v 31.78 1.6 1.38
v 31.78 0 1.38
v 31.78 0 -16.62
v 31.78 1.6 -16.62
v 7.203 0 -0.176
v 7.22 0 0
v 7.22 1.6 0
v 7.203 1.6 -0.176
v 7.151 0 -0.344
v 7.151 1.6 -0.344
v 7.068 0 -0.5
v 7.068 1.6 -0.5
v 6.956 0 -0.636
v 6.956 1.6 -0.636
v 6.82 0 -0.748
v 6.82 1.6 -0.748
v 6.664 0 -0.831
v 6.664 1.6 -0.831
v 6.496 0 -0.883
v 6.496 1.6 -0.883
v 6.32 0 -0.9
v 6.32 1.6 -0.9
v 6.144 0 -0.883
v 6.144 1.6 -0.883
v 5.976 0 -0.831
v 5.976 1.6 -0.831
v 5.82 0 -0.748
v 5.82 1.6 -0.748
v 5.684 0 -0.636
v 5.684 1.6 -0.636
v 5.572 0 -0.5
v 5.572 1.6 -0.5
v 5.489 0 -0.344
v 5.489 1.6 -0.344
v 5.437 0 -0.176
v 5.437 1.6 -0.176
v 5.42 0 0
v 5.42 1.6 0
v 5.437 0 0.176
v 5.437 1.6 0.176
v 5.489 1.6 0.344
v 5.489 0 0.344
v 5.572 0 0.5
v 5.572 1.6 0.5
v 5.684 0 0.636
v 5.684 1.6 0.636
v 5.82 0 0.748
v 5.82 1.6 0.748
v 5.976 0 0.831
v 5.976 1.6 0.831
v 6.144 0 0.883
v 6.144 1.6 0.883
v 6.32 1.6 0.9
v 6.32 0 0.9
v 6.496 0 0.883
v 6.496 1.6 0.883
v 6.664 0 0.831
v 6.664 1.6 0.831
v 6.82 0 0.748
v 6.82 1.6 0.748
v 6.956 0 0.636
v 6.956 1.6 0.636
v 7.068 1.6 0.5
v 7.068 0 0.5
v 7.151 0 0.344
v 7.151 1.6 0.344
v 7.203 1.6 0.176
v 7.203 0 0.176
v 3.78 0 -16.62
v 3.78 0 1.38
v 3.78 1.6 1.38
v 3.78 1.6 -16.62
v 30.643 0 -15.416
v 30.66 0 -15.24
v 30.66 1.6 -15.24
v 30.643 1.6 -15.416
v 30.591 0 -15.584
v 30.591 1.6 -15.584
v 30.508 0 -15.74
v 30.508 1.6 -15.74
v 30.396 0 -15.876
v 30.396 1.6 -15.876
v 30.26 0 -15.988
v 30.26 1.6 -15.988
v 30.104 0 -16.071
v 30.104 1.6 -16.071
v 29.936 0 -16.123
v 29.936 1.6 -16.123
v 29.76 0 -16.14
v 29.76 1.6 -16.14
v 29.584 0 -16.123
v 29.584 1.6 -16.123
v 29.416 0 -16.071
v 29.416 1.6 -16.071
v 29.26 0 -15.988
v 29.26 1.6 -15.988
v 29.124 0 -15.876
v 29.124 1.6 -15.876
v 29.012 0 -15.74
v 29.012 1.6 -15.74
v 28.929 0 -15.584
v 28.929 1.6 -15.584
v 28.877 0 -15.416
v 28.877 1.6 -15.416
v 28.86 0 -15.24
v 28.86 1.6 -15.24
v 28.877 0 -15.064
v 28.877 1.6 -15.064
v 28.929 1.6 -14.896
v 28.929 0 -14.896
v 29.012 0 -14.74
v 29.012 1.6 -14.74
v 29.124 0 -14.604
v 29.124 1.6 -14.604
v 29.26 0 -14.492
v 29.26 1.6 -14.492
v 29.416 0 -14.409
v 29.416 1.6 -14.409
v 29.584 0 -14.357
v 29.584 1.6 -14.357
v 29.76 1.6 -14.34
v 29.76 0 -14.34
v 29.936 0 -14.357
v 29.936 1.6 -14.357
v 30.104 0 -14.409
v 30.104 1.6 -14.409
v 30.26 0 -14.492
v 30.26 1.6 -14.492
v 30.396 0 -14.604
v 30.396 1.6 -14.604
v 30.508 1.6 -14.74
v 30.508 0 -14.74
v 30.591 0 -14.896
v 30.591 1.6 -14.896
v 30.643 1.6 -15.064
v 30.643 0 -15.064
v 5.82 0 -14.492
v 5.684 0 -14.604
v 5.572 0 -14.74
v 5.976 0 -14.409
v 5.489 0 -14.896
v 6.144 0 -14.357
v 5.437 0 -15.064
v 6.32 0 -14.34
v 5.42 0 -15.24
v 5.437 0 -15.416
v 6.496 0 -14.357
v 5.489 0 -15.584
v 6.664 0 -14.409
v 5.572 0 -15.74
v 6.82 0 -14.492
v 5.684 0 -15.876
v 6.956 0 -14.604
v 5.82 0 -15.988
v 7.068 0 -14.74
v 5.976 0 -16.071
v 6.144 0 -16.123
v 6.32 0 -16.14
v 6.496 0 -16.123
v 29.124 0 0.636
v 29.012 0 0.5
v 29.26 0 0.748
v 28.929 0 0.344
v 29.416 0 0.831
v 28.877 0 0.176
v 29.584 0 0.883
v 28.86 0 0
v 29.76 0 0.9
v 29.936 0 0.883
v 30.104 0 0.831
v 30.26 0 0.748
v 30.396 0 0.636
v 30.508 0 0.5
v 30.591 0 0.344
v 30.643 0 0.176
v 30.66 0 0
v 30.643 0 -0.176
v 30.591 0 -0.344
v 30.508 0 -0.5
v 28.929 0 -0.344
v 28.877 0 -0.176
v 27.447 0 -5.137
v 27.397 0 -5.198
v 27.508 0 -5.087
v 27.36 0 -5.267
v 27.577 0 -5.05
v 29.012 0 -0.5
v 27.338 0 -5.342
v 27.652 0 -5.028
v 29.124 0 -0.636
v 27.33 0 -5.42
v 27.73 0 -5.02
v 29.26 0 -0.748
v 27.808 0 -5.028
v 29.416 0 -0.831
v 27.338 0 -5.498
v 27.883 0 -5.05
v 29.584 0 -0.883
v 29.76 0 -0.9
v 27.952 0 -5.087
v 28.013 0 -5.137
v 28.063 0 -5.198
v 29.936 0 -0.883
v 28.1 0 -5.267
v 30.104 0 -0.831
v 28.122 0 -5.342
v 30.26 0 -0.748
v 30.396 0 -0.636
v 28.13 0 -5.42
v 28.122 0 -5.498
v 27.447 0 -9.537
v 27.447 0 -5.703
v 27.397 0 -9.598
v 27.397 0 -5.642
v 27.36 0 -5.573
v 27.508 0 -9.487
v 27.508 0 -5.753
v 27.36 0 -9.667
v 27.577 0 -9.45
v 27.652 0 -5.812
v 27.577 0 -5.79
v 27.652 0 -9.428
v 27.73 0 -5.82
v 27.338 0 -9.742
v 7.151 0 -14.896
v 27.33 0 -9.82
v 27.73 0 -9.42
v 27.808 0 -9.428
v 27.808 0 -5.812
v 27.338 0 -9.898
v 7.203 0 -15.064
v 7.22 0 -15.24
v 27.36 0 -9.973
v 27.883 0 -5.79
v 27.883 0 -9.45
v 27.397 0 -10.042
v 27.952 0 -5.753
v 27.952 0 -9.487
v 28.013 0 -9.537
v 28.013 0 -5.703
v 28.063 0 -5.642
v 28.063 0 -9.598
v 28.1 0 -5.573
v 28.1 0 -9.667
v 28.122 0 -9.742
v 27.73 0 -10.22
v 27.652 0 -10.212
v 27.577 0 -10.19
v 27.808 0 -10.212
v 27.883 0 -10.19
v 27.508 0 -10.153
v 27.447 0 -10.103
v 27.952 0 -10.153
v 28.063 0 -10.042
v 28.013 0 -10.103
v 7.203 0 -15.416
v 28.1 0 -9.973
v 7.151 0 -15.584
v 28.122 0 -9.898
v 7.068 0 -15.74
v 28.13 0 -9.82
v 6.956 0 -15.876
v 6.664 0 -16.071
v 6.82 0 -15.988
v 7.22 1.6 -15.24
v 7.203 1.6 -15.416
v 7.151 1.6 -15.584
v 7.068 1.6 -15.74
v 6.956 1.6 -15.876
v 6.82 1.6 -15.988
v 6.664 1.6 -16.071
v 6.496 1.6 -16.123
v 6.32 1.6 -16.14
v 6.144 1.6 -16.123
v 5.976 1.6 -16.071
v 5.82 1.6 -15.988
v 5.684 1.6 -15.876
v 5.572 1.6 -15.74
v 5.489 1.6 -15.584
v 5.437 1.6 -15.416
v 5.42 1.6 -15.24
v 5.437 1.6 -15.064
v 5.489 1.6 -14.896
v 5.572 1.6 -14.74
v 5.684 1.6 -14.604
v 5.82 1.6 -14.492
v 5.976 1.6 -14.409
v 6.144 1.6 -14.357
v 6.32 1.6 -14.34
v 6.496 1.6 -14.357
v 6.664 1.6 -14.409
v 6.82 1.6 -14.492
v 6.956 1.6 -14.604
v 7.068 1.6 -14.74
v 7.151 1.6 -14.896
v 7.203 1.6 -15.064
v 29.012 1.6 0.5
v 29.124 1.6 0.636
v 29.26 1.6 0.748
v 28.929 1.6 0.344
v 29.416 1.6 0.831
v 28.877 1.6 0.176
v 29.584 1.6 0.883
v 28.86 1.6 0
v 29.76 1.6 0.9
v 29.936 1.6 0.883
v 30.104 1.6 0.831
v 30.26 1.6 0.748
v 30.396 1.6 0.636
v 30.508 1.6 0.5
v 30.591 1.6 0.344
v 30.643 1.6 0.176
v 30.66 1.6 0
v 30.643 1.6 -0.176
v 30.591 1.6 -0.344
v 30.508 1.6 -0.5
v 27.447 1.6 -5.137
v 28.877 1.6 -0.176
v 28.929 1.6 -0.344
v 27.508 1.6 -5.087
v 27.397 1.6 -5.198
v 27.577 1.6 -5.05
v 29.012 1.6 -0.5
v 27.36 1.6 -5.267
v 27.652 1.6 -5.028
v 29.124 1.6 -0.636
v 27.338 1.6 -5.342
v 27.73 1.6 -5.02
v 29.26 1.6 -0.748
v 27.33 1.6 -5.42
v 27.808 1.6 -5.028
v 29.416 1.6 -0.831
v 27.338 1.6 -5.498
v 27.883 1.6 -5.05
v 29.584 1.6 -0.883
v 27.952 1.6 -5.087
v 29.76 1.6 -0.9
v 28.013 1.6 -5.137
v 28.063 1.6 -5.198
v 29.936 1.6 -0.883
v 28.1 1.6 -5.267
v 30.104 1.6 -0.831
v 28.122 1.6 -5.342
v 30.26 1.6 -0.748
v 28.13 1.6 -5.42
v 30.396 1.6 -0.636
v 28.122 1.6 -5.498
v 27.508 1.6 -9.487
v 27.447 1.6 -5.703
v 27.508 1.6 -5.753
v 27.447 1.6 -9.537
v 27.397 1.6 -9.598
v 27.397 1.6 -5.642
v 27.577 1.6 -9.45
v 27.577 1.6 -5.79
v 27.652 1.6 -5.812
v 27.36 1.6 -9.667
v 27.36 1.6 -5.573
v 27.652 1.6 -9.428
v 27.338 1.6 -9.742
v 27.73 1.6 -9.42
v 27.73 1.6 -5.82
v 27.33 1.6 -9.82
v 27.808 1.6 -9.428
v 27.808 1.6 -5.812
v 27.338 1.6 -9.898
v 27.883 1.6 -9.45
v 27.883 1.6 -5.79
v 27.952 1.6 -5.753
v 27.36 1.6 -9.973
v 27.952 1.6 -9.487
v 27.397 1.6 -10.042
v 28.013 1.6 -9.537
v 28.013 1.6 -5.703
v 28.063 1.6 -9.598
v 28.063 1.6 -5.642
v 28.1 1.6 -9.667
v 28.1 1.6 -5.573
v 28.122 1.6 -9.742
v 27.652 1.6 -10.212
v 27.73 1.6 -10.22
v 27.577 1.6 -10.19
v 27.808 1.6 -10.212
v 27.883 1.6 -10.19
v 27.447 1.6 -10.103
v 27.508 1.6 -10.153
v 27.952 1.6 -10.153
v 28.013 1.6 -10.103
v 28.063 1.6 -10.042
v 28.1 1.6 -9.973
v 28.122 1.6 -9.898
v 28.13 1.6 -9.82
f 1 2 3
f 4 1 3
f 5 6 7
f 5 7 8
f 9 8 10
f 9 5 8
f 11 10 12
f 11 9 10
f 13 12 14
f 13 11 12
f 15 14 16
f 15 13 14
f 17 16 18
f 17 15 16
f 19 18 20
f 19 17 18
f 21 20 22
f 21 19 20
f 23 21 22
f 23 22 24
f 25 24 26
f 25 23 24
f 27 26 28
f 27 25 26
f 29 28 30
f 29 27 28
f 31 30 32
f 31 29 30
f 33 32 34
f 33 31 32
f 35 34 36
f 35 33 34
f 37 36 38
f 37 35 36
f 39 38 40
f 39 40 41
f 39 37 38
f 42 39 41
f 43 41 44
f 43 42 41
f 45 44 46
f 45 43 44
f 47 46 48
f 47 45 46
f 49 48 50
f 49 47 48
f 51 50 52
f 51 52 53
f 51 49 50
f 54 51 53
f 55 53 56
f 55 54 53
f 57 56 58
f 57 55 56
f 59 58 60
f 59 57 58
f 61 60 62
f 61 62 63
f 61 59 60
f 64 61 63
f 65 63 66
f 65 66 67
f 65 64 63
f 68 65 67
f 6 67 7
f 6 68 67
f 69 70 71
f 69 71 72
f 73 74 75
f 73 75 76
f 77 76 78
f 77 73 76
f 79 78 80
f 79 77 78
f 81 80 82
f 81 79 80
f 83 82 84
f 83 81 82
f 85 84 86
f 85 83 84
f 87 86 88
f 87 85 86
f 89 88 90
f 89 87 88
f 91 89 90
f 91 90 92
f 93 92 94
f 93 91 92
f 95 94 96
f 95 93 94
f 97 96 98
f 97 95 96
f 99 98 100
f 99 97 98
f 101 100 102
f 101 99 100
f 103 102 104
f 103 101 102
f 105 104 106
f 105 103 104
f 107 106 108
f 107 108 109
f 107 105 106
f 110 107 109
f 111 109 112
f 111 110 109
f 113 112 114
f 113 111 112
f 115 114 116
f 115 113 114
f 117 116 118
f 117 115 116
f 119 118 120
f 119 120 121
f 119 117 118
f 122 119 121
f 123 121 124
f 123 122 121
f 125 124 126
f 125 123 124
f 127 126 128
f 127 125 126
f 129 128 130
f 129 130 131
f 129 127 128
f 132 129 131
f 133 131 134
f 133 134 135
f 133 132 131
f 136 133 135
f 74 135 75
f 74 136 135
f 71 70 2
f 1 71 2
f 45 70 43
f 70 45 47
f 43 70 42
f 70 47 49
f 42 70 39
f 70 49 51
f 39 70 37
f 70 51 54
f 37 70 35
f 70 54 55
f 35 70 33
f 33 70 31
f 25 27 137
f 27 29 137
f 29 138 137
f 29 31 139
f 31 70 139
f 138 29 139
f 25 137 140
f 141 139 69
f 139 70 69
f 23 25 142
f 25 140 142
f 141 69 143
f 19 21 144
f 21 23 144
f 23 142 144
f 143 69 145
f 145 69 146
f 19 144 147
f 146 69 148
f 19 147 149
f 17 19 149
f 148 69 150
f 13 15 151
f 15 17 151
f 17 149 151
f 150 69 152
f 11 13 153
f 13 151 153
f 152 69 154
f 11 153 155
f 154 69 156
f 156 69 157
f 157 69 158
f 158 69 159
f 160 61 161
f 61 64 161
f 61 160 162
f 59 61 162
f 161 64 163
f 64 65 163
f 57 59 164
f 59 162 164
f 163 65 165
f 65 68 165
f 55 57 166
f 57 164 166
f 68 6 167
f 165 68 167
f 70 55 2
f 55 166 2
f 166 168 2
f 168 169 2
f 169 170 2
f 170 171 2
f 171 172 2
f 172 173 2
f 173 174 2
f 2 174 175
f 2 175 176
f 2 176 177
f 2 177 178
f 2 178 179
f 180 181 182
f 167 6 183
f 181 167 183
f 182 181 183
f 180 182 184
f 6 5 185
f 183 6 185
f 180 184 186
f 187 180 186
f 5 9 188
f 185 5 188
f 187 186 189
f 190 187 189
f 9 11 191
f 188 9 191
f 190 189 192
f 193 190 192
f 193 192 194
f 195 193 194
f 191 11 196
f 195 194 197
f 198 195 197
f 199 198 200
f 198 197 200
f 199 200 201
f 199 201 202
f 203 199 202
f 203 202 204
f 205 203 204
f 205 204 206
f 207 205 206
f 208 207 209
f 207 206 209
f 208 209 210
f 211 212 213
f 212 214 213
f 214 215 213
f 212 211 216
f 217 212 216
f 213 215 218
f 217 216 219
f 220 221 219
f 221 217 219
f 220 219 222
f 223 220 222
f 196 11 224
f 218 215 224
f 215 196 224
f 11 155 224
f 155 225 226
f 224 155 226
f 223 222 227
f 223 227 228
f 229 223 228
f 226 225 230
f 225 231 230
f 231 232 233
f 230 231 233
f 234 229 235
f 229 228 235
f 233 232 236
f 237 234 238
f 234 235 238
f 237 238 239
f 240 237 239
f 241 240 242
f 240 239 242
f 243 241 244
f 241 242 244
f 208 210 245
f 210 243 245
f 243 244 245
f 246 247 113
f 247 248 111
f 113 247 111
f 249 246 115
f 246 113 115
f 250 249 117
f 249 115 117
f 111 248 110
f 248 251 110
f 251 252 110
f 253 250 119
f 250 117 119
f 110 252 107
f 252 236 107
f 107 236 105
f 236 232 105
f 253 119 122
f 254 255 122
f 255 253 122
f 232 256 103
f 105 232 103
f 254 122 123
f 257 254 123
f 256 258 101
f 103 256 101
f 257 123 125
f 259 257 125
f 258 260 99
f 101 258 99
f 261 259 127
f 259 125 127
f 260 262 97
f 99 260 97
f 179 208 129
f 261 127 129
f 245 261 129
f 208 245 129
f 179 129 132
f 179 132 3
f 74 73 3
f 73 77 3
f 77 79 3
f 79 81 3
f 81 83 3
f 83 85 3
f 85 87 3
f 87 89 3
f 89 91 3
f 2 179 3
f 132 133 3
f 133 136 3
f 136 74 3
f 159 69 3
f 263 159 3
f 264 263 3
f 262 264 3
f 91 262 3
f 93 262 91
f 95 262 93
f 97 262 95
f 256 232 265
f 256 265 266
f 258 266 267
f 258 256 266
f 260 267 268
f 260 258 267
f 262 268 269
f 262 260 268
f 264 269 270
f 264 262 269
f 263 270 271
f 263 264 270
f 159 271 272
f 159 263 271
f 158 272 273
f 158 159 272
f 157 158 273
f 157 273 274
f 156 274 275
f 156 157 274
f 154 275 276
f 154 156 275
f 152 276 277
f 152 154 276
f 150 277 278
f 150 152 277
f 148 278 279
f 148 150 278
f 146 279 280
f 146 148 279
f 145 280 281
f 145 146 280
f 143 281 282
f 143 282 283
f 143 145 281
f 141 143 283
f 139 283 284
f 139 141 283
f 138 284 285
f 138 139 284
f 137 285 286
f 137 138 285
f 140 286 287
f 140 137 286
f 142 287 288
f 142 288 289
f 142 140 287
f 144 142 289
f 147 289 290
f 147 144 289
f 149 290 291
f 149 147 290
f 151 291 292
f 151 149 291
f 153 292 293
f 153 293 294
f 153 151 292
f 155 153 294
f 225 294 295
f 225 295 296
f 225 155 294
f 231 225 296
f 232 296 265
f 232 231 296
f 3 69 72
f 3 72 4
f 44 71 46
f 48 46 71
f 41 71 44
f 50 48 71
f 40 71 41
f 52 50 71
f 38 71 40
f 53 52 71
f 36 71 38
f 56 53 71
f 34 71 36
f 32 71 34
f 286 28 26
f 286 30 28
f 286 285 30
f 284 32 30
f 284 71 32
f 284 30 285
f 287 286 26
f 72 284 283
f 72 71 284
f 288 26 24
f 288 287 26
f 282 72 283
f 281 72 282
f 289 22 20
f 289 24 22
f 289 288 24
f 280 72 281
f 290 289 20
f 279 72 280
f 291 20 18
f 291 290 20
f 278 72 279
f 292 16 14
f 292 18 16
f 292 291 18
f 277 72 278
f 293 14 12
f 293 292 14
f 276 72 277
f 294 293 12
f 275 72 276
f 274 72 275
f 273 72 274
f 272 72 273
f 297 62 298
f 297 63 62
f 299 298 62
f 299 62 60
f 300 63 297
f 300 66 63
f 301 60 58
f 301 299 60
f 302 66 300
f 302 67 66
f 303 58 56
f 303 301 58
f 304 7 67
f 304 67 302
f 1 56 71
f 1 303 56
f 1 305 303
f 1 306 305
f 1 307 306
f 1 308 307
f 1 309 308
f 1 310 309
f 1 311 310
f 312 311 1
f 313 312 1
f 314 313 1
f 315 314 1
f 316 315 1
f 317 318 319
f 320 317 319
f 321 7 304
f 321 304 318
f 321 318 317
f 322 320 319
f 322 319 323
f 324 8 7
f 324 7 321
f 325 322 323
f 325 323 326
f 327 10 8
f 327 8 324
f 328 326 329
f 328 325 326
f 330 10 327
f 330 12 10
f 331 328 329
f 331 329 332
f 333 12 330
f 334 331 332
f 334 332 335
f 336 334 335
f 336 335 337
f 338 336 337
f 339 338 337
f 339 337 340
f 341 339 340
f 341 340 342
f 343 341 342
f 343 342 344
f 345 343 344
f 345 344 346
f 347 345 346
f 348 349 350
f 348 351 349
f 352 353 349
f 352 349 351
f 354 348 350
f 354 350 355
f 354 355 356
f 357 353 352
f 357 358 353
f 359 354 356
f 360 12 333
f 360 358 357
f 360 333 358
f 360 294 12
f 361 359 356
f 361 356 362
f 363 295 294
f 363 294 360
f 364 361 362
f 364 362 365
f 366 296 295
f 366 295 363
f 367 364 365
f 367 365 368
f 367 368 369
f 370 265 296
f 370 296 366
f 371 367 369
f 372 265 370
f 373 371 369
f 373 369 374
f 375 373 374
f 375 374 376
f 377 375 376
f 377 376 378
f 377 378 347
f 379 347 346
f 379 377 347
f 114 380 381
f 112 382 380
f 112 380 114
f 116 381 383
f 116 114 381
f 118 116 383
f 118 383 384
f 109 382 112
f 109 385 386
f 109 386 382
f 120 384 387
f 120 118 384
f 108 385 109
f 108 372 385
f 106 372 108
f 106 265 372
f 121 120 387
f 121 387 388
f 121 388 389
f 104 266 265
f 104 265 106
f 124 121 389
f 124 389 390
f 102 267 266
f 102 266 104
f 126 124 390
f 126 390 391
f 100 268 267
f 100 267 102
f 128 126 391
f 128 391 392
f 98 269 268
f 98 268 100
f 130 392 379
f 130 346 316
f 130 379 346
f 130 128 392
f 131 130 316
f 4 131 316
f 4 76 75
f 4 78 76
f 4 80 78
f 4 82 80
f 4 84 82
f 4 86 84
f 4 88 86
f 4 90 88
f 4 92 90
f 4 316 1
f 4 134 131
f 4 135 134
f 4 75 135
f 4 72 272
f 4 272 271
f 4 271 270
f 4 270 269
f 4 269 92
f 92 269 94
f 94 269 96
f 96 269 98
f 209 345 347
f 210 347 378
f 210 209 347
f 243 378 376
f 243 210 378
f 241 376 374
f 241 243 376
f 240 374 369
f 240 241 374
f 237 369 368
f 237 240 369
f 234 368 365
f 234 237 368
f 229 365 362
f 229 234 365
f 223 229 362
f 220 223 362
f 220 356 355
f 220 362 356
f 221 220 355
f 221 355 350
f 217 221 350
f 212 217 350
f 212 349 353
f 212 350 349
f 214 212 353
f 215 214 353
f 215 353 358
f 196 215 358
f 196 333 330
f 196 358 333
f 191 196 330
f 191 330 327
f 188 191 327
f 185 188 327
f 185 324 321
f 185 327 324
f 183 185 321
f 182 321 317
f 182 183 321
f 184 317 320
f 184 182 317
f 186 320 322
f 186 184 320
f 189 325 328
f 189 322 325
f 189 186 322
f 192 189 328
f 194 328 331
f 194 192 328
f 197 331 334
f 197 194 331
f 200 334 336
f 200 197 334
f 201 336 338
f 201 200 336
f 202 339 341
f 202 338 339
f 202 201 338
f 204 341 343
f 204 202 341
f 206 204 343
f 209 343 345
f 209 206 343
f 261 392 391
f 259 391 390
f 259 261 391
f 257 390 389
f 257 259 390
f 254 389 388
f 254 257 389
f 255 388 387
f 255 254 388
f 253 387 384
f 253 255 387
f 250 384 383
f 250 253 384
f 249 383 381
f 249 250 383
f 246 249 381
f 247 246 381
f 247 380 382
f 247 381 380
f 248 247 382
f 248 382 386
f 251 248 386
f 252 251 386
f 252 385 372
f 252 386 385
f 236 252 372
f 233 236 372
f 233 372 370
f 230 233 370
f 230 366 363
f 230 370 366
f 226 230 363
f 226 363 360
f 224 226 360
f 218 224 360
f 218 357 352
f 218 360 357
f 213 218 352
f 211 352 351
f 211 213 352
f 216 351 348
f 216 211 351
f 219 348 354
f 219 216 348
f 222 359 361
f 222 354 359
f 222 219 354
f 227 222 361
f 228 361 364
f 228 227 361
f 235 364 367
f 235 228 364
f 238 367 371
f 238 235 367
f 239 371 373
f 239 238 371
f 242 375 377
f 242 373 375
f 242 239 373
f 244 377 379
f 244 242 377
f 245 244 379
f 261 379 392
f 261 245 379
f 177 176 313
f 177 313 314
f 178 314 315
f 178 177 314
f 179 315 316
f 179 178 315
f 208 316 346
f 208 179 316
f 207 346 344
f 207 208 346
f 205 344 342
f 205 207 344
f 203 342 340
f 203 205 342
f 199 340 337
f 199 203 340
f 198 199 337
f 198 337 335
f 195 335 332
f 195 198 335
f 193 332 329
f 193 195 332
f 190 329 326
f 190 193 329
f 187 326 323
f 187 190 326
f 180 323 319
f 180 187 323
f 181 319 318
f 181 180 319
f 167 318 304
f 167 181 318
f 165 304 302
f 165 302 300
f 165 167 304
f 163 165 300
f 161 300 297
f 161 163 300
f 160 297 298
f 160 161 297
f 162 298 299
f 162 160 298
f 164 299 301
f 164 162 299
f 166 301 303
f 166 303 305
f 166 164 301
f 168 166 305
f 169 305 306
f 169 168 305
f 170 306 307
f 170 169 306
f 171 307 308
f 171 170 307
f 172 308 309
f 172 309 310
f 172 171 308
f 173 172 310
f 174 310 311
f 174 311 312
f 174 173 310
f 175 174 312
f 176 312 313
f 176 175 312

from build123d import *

# Parameters (mm, degrees)
SKETCH1_W           = 28
SKETCH1_H           = 18
BOSS_EXTRUDE2_DEPTH = 1.6
SKETCH4_R           = 0.9
CUT_EXTRUDE5_DEPTH  = 1.6
SKETCH9_R           = 0.4
CUT_EXTRUDE6_DEPTH  = 10


with BuildPart() as part:
    # Sketch1 → Boss-Extrude2 (new body)
    with BuildSketch(Plane(origin=(0, 0, 0), x_dir=(1, 0, 0), z_dir=(0, 1, 0))):
        with Locations((17.78, 7.62)):
            Rectangle(SKETCH1_W, SKETCH1_H)
    extrude(amount=BOSS_EXTRUDE2_DEPTH)

    # Sketch4 → Cut-Extrude5 (cut)
    with BuildSketch(Plane(origin=(0, 0, 0), x_dir=(1, 0, 0), z_dir=(0, 1, 0))):
        with Locations((29.76, 15.24)):
            Circle(SKETCH4_R)
        with Locations((29.76, 0)):
            Circle(SKETCH4_R)
        with Locations((6.32, 0)):
            Circle(SKETCH4_R)
        with Locations((6.32, 15.24)):
            Circle(SKETCH4_R)
    extrude(amount=CUT_EXTRUDE5_DEPTH, mode=Mode.SUBTRACT)

    # Sketch9 → Cut-Extrude6 (cut)
    with BuildSketch(Plane(origin=(0, 0, 0), x_dir=(1, 0, 0), z_dir=(0, 1, 0))):
        with Locations((27.73, 5.42)):
            Circle(SKETCH9_R)
        with Locations((27.73, 9.82)):
            Circle(SKETCH9_R)
    extrude(amount=CUT_EXTRUDE6_DEPTH, mode=Mode.SUBTRACT)


solid = part.part
